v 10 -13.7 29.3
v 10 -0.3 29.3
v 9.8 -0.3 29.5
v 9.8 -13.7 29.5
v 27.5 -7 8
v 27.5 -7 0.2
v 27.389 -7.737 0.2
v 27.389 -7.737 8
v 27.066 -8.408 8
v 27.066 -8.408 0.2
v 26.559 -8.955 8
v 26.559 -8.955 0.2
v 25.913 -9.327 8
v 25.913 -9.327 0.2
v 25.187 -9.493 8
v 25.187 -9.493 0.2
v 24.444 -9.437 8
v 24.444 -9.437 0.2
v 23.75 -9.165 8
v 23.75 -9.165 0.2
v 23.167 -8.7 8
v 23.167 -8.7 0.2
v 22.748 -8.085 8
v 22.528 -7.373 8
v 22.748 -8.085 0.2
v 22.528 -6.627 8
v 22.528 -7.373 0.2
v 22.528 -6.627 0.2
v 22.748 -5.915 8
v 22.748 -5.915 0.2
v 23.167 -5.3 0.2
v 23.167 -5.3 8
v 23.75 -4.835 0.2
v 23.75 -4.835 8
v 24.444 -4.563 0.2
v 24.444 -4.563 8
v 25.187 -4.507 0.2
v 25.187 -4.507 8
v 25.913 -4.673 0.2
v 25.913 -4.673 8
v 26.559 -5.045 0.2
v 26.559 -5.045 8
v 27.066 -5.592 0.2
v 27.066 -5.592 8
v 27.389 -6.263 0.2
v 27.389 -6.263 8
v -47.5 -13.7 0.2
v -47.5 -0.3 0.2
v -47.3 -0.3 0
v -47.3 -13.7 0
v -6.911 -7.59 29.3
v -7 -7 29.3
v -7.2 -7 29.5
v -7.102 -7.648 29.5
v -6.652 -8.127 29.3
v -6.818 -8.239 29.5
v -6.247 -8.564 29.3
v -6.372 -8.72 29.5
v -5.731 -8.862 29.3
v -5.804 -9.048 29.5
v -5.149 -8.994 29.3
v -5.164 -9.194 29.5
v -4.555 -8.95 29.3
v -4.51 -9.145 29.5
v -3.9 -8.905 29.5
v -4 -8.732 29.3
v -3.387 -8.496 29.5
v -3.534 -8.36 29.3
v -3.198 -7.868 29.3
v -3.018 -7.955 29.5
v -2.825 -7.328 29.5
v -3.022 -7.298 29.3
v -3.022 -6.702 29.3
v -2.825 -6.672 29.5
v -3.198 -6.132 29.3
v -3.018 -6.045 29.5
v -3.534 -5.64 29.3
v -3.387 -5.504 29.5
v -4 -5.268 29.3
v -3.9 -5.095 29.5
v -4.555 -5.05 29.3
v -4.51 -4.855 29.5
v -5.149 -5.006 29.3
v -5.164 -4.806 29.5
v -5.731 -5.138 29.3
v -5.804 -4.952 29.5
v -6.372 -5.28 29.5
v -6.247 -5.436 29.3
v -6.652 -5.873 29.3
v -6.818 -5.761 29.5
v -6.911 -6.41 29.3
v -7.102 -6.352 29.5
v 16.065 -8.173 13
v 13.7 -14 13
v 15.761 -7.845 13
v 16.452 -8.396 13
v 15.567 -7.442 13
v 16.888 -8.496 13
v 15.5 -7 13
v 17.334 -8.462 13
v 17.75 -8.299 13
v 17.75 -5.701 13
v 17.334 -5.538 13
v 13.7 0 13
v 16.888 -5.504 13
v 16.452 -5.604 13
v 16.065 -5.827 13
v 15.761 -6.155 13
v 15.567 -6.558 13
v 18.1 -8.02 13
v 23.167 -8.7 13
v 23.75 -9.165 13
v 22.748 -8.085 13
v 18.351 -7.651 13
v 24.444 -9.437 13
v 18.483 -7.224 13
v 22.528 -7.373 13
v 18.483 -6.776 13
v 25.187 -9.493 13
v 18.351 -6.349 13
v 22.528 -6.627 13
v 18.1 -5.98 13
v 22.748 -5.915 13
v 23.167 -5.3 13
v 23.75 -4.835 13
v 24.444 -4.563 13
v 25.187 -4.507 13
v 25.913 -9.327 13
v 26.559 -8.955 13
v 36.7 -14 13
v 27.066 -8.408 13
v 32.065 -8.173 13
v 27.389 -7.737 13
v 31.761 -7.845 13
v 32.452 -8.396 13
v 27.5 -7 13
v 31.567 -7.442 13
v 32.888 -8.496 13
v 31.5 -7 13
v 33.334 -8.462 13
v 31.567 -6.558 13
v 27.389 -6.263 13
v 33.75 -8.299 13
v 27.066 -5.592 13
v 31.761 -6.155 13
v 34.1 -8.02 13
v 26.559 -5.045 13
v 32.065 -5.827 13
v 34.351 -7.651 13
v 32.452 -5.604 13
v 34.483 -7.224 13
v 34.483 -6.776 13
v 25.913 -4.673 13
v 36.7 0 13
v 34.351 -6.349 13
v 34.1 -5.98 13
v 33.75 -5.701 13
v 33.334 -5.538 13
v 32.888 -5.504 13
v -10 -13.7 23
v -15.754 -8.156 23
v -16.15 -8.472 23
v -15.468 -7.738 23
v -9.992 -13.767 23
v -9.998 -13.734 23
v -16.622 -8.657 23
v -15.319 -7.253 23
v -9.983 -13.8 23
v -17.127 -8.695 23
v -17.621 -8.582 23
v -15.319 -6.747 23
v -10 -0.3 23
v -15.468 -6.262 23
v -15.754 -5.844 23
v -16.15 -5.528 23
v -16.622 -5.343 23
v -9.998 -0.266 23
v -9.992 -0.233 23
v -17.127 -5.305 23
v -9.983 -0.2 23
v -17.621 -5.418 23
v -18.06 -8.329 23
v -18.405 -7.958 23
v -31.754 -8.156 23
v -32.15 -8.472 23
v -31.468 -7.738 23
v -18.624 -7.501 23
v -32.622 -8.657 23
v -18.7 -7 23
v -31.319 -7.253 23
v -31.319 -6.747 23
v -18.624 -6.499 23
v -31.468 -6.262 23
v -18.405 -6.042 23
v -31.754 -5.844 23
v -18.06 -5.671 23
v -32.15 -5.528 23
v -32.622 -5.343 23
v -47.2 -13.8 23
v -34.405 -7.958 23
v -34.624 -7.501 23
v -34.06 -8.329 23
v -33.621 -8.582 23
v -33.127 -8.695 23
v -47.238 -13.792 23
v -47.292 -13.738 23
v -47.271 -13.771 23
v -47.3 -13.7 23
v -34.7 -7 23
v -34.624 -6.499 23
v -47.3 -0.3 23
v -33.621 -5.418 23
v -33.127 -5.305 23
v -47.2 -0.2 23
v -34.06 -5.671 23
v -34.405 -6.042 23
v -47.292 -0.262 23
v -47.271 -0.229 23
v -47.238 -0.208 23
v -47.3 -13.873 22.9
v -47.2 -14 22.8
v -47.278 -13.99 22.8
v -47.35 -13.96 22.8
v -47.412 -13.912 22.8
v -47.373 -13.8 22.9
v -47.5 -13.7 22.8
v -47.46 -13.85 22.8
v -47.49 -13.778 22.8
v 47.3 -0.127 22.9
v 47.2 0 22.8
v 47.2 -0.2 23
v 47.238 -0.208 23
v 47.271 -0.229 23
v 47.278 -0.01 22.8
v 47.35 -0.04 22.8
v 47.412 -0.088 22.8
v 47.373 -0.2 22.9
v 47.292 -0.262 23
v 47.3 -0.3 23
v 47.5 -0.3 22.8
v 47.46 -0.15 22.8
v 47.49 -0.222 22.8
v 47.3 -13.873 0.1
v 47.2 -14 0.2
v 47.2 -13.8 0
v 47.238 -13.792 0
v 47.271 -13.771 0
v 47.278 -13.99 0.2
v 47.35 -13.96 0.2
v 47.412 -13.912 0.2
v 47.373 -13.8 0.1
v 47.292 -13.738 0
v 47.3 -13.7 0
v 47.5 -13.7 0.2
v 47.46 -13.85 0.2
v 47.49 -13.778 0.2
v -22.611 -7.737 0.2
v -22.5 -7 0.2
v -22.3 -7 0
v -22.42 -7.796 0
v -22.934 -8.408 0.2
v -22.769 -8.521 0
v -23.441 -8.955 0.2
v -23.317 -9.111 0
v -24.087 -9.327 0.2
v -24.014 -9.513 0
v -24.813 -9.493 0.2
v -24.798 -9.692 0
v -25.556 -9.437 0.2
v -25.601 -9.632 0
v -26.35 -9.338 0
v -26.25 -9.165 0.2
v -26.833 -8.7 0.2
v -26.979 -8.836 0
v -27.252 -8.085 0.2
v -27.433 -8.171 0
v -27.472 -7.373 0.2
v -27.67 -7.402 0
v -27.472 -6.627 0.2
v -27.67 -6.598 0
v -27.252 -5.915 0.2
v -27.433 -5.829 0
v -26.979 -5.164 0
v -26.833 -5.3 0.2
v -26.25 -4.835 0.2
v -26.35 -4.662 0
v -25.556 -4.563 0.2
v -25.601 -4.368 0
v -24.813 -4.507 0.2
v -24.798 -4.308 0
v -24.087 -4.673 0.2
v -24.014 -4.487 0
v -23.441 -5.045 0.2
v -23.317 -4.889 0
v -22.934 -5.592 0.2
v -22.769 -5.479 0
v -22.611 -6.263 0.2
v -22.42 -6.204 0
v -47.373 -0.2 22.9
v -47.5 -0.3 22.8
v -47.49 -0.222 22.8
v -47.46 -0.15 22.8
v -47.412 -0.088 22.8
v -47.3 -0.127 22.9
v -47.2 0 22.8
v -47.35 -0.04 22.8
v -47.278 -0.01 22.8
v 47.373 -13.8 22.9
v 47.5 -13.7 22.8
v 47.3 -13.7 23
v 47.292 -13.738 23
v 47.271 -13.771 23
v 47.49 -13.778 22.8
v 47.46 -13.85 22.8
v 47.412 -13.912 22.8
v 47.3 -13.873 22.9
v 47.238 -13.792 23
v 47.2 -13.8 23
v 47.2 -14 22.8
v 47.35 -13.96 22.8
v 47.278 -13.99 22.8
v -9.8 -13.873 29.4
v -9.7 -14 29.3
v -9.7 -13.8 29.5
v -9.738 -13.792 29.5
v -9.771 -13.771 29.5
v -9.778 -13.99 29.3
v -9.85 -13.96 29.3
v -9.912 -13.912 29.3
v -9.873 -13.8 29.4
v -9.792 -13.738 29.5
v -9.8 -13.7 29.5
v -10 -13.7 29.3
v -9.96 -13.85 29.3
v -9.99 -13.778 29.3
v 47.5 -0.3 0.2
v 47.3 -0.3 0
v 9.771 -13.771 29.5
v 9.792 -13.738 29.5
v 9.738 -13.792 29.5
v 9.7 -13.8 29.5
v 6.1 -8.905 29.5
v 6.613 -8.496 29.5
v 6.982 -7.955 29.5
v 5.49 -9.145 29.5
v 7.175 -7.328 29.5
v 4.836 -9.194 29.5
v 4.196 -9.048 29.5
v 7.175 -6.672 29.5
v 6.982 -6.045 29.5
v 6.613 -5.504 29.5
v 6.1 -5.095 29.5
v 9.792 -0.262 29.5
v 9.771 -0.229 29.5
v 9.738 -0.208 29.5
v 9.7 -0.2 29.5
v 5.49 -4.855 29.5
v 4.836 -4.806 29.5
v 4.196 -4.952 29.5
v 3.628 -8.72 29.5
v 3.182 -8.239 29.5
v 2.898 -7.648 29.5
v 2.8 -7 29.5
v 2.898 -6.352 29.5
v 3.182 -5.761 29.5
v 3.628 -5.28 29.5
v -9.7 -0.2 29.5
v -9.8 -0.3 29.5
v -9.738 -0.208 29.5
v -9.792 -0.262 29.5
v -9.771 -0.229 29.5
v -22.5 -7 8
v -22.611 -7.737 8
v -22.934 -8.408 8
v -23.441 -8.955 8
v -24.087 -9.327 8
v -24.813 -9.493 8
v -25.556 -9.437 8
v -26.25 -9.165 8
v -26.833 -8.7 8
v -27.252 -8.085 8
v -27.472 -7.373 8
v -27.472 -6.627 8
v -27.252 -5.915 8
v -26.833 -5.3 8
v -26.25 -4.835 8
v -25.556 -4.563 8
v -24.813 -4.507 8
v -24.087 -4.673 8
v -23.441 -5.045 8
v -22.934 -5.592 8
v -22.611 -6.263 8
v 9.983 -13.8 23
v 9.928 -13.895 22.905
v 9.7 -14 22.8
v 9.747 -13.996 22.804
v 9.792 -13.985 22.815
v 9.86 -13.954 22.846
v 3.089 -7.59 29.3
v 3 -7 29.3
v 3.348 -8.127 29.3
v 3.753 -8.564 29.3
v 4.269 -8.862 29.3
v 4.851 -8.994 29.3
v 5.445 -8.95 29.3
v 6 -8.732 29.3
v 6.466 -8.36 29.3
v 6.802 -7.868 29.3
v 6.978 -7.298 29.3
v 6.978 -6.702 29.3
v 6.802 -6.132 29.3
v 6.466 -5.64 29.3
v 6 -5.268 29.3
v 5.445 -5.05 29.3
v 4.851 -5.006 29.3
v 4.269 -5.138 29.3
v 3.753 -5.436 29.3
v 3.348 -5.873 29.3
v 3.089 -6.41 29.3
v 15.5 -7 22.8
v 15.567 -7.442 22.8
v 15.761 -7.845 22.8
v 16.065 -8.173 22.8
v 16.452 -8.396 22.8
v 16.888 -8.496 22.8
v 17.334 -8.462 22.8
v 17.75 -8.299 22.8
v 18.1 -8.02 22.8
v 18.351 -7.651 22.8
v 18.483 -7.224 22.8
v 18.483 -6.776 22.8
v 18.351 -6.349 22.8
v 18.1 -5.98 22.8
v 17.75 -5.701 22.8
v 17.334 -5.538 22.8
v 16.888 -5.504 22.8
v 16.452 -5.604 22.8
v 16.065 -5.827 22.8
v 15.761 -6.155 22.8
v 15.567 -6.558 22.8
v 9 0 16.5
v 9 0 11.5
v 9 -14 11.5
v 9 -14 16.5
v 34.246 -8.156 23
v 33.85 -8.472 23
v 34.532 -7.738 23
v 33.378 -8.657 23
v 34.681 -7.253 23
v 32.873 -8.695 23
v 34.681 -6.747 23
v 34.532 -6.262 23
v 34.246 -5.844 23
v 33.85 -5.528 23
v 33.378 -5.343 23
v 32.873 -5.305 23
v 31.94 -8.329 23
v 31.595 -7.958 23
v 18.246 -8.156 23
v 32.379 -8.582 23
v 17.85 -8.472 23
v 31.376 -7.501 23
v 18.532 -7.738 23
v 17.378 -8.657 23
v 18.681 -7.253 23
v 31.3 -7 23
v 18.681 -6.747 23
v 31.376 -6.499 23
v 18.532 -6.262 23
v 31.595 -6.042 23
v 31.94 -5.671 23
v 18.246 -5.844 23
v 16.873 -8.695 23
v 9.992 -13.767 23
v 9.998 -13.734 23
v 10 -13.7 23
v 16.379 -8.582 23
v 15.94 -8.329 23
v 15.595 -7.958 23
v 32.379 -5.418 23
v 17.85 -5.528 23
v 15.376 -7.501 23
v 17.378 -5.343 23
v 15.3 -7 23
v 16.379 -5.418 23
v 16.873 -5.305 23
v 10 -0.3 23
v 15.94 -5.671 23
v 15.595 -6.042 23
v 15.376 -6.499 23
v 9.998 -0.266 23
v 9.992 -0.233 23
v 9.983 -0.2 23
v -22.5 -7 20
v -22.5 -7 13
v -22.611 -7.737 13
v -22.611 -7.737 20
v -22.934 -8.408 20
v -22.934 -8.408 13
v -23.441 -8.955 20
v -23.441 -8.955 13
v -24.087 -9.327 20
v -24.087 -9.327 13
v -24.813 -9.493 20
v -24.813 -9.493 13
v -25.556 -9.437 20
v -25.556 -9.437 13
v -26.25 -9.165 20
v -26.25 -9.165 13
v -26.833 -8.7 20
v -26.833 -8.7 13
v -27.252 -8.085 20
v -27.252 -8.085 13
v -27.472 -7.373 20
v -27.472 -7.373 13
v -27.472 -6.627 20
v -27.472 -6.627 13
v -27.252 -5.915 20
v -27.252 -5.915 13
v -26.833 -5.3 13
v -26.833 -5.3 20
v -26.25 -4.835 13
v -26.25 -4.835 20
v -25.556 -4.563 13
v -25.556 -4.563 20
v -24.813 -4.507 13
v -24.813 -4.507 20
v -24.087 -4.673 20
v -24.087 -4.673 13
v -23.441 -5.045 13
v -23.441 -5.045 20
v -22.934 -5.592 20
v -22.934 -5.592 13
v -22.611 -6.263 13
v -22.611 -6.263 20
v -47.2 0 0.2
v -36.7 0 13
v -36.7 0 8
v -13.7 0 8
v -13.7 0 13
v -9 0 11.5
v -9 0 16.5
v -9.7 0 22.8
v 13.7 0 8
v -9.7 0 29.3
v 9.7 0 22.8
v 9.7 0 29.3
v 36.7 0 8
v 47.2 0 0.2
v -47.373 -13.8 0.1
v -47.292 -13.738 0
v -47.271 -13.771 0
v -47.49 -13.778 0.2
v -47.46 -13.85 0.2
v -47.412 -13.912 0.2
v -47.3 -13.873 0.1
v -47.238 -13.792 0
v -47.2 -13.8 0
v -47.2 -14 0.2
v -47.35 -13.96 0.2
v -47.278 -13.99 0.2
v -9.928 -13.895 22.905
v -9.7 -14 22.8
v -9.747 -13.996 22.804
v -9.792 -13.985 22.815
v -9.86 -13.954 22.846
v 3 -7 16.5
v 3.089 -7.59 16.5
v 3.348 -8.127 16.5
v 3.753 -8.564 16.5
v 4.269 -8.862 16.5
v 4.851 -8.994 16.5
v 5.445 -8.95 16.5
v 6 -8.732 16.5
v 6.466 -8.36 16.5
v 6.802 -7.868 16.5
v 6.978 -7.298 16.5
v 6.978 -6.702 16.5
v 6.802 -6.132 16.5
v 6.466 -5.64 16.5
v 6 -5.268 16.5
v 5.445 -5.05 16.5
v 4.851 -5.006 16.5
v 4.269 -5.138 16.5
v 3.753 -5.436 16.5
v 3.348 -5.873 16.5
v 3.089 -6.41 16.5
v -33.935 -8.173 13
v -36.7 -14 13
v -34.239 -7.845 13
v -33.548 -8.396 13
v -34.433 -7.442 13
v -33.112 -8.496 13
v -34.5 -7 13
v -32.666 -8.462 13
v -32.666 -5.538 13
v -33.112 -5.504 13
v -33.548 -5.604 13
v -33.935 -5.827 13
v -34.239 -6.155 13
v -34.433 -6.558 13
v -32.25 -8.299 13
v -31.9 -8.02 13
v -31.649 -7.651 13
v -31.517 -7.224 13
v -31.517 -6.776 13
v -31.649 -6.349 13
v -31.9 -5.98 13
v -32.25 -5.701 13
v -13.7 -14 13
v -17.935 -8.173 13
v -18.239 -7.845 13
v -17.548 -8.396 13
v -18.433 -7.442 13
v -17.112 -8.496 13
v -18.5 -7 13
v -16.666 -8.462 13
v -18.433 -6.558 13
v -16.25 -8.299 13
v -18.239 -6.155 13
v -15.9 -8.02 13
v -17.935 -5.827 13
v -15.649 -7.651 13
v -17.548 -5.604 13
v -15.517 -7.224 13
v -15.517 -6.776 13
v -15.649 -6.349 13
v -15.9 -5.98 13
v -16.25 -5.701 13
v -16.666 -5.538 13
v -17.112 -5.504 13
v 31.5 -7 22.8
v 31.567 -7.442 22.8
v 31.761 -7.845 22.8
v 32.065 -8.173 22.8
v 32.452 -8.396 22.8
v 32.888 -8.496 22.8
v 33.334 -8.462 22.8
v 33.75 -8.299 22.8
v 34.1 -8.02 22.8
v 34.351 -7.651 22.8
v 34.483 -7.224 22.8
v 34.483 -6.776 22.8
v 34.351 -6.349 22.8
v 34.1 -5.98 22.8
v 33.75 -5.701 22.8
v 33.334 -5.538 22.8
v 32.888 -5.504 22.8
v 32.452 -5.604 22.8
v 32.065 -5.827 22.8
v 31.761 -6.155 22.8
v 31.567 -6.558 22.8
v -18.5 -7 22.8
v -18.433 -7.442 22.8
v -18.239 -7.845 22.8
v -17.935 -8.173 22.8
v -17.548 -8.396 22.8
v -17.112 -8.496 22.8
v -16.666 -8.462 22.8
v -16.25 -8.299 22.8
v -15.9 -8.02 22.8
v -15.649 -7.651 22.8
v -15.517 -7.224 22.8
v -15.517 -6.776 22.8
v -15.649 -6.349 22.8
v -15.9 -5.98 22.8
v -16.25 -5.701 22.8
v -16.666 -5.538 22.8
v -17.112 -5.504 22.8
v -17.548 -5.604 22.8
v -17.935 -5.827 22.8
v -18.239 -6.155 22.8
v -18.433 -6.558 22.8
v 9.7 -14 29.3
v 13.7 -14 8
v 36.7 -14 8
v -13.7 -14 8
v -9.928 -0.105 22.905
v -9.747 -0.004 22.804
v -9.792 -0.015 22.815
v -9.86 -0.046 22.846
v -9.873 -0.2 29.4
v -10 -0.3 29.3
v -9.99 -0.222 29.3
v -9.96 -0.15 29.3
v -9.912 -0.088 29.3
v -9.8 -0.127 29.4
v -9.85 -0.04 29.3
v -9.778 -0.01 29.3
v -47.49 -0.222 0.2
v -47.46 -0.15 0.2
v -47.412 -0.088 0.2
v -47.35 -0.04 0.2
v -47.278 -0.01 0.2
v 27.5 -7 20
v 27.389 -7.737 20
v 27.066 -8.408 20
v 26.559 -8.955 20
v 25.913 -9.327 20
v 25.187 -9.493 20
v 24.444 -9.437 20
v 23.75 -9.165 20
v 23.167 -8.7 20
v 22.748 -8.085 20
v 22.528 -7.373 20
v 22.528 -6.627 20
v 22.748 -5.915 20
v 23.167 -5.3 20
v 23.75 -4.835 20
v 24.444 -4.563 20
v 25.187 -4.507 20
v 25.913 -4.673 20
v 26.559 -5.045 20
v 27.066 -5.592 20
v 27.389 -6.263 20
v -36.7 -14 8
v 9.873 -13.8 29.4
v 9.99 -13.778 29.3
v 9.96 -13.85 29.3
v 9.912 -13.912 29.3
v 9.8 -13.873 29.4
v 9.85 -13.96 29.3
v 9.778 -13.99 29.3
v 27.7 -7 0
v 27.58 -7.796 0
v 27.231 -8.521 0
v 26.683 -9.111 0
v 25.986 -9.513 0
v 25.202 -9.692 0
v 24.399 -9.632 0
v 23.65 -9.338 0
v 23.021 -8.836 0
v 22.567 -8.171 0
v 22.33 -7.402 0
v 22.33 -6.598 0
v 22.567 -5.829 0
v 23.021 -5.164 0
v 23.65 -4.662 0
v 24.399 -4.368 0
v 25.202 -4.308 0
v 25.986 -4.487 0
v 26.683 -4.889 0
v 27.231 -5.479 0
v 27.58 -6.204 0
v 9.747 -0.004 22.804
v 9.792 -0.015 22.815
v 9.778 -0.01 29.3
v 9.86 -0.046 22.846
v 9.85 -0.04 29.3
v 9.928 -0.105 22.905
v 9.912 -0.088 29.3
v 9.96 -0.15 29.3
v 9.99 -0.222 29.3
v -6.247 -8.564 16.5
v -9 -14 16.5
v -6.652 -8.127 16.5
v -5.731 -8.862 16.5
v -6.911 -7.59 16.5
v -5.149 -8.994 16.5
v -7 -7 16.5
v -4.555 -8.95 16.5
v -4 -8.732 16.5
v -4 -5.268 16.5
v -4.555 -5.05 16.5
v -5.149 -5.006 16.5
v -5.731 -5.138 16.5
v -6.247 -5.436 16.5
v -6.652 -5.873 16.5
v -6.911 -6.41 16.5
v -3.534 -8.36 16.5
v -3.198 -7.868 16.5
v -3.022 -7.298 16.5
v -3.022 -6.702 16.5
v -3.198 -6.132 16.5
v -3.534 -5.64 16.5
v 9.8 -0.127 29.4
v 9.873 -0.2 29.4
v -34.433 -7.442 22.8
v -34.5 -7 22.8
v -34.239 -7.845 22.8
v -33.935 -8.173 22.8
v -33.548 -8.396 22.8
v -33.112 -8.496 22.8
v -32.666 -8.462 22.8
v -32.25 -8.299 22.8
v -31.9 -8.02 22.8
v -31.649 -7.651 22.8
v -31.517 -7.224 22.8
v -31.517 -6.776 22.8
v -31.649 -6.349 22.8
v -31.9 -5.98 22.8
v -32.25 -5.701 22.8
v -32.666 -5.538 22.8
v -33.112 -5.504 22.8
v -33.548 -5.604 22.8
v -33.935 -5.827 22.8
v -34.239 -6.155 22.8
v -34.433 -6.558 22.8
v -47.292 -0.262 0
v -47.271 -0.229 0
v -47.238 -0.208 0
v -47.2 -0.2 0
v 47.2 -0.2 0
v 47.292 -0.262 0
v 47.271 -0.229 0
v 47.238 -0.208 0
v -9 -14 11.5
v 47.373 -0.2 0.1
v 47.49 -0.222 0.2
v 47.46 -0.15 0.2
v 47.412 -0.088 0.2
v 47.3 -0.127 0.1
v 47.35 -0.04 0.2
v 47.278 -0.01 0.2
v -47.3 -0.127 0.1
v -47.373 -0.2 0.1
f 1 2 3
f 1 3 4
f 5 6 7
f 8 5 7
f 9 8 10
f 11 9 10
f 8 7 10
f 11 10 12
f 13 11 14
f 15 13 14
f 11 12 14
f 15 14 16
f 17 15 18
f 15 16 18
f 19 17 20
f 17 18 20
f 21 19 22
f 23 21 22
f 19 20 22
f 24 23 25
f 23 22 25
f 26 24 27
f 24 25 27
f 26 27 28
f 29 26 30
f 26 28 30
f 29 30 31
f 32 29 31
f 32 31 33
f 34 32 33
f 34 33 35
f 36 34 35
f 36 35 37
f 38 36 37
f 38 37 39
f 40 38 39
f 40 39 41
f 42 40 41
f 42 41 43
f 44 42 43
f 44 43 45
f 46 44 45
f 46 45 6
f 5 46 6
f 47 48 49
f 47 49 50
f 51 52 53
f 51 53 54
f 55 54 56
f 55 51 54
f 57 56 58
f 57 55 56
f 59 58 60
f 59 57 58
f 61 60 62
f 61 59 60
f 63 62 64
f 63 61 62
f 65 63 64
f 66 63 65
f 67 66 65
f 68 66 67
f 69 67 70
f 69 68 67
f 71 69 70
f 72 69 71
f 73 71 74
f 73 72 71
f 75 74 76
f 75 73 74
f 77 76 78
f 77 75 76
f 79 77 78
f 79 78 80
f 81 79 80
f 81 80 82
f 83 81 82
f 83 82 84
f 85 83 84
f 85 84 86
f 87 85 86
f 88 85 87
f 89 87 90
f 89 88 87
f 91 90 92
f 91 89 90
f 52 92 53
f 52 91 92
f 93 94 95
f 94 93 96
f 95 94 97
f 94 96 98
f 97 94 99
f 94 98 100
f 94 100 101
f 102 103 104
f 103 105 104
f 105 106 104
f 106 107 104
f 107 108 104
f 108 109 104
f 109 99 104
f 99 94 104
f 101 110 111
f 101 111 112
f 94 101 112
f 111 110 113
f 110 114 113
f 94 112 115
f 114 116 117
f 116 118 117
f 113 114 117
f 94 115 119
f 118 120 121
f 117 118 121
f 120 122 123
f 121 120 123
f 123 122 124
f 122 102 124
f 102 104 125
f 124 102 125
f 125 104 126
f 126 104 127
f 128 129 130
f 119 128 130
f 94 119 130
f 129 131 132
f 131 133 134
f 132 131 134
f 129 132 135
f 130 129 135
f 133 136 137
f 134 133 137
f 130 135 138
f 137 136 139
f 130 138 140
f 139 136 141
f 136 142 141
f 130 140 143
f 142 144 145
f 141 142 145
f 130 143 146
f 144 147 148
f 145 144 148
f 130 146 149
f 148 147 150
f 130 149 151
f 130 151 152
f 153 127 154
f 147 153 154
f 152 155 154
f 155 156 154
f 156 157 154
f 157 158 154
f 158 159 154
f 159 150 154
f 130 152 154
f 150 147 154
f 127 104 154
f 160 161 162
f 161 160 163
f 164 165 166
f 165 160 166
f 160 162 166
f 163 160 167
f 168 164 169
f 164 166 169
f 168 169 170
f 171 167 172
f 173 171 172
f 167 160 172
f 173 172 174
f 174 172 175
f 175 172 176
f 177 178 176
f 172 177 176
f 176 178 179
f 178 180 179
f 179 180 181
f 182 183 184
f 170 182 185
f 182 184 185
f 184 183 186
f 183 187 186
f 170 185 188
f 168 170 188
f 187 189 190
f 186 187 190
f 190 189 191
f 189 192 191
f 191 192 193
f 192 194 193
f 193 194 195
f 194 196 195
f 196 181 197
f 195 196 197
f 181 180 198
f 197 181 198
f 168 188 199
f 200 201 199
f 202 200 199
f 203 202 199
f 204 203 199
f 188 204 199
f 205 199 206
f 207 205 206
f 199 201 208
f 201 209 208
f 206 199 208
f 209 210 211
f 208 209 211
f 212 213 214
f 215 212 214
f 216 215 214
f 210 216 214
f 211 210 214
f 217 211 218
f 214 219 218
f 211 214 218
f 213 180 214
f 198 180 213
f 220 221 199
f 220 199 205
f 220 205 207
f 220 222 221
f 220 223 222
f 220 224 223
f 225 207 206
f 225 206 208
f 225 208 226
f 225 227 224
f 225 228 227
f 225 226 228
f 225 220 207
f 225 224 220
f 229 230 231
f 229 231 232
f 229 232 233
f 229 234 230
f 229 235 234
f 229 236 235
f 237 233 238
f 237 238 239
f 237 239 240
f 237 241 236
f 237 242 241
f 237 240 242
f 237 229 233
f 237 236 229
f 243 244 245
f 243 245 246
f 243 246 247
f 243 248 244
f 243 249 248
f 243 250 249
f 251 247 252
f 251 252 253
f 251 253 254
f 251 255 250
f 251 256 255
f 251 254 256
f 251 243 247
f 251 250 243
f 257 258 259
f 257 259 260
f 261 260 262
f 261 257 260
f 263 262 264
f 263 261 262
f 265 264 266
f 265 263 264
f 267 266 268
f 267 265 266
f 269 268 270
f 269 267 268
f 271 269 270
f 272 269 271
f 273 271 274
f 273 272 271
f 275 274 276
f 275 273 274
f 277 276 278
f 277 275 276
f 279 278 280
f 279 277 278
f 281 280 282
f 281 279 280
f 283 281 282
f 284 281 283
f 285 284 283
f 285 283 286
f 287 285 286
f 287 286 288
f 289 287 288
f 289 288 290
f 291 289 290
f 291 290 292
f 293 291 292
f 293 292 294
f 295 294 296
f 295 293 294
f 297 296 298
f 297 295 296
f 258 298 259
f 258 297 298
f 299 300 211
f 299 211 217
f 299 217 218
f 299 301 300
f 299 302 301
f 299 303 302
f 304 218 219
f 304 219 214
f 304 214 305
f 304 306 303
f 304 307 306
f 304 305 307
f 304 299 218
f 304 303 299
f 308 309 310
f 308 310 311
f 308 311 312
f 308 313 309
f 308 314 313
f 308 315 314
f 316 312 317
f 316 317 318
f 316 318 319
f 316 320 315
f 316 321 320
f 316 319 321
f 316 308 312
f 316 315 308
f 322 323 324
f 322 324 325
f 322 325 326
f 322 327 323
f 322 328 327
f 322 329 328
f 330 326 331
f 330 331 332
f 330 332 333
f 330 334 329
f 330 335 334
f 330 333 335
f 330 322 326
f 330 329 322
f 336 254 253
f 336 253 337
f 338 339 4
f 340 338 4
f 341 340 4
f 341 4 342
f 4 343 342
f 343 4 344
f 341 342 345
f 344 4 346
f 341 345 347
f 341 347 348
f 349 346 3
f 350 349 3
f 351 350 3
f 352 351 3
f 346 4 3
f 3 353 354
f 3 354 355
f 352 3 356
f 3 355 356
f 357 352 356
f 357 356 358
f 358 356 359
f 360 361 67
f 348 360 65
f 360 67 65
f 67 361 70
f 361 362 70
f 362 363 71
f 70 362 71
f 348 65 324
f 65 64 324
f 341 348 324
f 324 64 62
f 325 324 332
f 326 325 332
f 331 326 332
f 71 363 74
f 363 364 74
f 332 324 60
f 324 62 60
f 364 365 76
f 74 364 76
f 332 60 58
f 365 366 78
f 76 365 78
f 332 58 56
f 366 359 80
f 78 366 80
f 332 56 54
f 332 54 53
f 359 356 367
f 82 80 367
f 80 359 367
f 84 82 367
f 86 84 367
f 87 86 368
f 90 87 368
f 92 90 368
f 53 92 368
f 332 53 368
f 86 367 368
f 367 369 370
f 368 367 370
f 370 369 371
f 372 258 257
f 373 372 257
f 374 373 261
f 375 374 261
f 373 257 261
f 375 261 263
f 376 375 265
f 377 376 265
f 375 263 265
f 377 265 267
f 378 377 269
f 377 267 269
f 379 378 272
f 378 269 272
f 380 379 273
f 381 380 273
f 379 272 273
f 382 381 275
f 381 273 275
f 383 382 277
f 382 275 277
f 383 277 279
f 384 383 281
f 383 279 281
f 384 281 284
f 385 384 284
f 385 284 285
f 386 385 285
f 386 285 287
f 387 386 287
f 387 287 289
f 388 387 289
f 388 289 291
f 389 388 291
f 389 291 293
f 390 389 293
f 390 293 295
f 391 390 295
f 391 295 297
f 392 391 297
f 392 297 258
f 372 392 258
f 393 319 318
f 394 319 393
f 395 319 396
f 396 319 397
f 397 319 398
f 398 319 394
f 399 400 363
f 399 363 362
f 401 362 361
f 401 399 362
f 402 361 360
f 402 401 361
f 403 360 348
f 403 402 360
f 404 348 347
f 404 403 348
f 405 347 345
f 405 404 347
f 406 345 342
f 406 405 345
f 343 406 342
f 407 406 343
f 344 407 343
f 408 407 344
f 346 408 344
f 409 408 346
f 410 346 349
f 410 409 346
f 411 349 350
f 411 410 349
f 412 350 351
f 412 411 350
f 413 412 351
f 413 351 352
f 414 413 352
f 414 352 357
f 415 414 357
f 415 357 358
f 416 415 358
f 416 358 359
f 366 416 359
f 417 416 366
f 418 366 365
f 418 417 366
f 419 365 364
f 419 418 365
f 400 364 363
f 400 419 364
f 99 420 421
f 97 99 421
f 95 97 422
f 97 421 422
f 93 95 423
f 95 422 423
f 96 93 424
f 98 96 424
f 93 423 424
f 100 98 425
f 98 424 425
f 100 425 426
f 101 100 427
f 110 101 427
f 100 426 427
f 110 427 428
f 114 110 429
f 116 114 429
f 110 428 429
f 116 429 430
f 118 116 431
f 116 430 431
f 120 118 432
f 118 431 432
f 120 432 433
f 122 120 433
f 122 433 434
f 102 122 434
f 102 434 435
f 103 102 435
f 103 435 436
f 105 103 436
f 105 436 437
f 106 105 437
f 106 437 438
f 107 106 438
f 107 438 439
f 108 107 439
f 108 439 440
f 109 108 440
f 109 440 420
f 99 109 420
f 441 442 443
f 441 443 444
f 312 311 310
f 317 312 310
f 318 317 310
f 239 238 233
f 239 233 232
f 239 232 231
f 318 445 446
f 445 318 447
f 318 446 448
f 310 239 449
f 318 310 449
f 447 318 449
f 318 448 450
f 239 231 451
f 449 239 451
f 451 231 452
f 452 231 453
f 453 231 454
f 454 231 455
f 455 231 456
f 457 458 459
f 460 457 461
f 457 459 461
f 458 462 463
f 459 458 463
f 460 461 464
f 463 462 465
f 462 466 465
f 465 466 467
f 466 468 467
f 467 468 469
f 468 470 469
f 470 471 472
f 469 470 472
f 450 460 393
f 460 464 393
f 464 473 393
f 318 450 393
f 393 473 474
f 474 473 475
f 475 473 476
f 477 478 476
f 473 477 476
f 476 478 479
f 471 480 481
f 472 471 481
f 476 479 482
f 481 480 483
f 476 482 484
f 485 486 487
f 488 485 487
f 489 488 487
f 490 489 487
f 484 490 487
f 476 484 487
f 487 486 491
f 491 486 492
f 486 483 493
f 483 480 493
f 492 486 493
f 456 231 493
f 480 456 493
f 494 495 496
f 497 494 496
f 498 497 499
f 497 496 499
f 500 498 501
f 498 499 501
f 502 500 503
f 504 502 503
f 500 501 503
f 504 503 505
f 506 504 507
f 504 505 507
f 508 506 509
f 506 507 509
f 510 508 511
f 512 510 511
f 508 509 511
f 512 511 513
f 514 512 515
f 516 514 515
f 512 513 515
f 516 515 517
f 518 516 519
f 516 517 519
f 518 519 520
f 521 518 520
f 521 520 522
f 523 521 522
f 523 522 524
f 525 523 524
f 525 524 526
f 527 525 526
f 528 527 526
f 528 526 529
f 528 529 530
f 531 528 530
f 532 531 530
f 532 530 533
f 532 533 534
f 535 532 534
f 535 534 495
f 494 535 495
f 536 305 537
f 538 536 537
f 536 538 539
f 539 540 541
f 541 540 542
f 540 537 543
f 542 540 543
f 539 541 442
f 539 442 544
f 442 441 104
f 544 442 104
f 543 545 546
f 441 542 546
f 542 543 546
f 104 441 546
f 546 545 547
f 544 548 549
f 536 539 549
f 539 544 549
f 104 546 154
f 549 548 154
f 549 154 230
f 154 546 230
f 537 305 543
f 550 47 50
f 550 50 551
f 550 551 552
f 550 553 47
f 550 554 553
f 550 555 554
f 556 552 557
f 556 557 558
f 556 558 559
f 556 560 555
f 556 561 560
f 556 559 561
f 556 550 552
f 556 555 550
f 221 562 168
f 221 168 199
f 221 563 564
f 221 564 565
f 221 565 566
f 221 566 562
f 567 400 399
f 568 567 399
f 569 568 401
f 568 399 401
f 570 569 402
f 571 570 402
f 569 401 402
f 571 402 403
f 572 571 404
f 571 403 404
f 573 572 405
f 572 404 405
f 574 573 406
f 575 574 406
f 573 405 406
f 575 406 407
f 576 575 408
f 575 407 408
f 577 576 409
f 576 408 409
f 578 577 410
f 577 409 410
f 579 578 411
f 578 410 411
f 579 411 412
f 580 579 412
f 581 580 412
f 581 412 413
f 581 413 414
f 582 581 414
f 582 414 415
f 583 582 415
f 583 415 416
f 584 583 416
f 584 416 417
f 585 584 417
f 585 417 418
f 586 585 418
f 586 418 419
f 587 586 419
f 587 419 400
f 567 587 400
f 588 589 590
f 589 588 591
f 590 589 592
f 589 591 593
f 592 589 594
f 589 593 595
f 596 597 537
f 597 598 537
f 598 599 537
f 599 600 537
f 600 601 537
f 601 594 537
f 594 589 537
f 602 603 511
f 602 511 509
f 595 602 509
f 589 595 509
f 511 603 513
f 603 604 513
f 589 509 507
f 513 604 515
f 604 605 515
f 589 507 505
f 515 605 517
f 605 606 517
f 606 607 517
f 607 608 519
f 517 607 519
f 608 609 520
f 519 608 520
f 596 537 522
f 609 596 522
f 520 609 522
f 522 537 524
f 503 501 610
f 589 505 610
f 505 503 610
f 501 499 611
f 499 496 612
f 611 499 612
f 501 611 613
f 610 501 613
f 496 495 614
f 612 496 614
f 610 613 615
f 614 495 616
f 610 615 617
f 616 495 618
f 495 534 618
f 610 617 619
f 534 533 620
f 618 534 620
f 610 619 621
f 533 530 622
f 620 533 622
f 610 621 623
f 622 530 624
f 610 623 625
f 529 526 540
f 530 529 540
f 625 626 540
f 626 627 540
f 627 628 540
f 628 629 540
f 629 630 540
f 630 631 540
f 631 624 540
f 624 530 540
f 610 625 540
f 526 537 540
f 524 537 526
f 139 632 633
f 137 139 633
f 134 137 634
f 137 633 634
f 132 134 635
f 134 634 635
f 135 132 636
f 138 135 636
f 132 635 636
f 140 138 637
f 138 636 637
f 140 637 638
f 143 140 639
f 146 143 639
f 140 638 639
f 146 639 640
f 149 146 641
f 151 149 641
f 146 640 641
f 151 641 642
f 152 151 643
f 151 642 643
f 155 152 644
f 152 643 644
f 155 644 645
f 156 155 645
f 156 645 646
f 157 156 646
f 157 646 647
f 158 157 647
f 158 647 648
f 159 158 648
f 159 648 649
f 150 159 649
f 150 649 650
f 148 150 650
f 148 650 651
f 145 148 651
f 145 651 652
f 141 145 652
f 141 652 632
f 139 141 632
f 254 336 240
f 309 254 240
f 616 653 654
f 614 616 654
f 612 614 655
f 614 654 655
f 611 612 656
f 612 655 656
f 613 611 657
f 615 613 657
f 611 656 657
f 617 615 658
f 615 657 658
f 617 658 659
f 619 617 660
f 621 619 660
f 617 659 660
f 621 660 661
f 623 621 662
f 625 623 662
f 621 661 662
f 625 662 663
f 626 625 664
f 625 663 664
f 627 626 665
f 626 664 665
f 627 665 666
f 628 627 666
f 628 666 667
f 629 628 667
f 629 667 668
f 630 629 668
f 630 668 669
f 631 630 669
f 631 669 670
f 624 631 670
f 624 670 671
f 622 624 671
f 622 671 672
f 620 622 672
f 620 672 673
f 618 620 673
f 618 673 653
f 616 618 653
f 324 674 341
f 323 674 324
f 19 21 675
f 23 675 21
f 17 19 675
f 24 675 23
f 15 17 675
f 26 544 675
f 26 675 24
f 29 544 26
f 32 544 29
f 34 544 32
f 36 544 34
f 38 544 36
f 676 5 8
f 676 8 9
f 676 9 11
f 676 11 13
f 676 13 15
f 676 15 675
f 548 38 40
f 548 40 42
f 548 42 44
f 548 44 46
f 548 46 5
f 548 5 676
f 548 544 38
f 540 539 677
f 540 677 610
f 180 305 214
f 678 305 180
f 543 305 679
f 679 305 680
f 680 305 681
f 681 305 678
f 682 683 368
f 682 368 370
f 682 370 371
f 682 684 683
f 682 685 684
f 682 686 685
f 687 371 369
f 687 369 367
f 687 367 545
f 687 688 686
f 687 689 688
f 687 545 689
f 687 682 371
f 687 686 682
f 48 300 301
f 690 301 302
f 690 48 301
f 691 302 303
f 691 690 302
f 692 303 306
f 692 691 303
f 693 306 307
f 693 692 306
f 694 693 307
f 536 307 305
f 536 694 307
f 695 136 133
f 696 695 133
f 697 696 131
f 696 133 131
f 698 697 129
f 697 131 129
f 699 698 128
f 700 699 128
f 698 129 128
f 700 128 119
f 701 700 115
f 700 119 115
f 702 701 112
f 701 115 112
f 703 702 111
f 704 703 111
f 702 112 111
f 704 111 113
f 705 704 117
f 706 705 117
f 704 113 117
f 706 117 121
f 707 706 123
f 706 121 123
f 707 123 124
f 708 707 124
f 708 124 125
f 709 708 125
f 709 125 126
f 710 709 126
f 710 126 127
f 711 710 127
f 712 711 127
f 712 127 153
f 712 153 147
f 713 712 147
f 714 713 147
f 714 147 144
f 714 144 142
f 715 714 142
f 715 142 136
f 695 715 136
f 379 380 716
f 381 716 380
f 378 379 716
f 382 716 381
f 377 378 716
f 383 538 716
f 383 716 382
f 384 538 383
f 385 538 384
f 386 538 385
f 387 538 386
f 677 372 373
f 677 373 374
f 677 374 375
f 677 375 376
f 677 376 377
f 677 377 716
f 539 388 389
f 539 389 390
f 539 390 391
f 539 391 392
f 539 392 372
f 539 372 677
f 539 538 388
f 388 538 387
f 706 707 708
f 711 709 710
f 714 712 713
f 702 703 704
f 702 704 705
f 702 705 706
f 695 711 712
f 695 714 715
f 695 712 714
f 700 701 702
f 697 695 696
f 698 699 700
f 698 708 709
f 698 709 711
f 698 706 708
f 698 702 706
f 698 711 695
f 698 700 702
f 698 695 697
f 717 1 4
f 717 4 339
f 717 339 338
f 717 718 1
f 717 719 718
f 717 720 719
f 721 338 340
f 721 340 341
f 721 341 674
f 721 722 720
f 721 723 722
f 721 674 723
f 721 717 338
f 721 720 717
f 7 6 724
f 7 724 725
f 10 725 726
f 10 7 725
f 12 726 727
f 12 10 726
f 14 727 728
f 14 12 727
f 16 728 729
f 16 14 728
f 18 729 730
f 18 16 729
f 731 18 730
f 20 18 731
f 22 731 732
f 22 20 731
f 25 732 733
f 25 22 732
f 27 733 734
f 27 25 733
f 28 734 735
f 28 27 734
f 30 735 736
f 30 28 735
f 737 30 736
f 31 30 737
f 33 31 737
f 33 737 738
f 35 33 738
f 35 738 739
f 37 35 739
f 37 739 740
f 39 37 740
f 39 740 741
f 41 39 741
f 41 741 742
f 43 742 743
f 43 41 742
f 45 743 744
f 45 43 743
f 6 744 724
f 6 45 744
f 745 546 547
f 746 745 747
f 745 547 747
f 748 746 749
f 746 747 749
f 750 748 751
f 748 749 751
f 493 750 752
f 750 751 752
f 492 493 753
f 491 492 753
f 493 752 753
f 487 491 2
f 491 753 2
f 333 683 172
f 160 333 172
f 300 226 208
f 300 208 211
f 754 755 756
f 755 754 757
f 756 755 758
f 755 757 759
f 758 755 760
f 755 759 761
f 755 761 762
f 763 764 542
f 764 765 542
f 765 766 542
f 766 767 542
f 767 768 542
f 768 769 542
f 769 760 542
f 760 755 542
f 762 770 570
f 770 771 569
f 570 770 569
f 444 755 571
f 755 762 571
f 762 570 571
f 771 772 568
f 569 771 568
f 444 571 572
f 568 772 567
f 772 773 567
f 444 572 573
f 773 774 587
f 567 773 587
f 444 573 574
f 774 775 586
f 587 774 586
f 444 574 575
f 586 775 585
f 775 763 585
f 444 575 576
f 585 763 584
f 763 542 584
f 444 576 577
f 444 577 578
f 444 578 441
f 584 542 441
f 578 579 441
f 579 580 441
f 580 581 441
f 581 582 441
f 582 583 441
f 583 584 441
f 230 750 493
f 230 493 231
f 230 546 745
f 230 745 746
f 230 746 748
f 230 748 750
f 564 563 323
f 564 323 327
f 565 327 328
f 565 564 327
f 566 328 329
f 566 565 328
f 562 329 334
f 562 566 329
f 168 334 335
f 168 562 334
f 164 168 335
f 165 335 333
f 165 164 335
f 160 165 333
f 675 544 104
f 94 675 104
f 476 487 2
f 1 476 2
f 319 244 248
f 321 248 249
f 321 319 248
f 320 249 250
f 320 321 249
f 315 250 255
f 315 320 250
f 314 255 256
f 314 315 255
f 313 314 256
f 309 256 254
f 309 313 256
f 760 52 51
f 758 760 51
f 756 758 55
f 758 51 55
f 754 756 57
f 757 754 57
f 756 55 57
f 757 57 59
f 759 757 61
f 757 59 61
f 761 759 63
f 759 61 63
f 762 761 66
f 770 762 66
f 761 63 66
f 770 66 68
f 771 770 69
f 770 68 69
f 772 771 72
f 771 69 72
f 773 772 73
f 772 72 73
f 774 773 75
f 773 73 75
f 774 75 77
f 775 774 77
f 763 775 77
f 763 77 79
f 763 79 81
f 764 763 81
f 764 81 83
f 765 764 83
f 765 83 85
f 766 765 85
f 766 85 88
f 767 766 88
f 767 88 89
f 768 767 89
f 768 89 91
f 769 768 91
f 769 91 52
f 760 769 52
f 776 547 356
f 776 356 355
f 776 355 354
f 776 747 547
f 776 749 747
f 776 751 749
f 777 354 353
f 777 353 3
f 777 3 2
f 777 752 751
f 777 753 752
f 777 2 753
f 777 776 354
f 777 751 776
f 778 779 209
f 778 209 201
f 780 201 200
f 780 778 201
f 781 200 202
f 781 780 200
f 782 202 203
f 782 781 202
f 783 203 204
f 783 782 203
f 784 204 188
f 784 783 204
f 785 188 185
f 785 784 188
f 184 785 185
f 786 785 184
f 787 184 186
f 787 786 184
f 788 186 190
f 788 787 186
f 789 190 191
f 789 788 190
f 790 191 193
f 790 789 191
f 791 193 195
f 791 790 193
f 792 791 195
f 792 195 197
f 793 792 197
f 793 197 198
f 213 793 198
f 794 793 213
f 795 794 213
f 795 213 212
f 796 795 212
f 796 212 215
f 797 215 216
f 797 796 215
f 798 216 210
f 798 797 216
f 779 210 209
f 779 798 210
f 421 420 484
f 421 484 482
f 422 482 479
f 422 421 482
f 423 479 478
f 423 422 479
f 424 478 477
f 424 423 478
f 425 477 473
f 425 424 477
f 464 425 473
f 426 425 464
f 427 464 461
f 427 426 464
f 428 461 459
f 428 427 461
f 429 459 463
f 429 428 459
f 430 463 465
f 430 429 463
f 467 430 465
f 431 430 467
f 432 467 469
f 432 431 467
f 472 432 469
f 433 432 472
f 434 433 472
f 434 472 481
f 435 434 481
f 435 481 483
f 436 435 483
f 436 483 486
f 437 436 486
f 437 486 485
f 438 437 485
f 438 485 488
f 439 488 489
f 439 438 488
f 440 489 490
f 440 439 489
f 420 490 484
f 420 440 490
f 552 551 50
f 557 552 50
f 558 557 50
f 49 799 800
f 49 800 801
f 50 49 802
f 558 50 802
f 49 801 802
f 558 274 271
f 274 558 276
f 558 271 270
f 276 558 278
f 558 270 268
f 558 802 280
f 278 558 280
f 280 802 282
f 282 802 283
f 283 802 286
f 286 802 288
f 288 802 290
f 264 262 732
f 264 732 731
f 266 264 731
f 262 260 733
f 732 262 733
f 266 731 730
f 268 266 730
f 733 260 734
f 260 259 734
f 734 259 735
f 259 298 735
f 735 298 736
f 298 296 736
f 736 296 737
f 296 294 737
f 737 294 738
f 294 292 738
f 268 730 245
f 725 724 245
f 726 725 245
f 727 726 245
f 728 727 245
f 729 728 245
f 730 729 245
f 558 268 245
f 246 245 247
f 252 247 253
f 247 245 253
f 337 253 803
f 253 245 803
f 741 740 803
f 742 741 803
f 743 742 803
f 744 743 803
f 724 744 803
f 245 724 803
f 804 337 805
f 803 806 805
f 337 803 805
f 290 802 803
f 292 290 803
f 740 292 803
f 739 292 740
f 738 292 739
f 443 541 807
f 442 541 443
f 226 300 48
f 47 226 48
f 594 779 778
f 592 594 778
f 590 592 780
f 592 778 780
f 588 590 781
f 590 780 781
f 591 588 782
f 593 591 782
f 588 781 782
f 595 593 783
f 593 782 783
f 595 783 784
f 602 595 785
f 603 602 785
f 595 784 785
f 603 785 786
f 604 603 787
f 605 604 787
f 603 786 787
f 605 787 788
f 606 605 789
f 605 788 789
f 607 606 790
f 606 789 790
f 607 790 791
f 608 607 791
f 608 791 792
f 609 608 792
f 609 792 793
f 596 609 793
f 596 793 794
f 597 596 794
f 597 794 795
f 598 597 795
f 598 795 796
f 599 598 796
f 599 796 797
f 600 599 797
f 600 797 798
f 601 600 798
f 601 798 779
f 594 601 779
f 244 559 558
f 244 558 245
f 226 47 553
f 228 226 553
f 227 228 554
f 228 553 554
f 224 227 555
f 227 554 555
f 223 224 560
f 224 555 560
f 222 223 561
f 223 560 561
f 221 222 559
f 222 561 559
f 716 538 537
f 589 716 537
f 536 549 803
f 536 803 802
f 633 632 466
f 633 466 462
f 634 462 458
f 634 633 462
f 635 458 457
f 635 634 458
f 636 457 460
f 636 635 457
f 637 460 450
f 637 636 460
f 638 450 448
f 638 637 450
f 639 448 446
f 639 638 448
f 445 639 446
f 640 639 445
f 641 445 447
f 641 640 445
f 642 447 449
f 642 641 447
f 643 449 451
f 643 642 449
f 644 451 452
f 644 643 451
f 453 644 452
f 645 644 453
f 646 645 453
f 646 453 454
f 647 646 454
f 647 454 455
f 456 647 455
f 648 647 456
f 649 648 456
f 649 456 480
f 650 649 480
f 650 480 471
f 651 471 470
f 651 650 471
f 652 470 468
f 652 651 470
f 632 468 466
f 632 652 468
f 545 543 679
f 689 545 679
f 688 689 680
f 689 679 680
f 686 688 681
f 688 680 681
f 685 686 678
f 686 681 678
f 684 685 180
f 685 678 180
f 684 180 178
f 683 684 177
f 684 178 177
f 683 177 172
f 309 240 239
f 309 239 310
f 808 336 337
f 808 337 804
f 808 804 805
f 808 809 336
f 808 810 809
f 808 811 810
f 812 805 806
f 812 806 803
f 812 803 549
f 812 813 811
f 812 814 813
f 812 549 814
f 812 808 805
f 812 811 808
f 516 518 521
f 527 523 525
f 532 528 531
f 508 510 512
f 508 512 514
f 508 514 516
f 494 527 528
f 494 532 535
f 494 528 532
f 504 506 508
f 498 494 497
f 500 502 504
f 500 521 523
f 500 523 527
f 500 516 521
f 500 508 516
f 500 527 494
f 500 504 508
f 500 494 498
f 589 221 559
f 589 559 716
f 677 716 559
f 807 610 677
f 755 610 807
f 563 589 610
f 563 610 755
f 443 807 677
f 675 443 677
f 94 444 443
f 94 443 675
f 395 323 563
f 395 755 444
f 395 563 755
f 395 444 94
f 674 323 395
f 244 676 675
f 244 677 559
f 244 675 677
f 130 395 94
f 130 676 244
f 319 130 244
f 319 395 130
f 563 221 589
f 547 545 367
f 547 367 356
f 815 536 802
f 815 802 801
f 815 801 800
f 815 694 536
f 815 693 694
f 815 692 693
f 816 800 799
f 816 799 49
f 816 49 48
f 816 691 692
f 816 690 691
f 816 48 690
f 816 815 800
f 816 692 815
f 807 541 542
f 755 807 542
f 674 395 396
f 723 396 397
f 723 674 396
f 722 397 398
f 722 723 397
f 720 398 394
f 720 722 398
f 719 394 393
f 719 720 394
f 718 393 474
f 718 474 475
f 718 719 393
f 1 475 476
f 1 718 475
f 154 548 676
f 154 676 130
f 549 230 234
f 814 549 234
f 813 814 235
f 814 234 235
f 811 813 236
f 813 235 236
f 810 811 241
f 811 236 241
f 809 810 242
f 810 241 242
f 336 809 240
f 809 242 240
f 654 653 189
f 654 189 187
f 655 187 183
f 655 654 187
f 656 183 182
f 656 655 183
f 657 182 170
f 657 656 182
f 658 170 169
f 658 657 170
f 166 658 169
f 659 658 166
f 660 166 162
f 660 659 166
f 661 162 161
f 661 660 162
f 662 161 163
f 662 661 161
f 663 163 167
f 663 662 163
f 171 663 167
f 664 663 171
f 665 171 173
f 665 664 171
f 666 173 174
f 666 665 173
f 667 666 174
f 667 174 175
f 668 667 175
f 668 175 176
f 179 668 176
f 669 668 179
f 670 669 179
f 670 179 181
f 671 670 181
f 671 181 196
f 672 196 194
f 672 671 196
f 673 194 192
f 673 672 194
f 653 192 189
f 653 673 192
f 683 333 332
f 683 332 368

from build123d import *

# Parameters (mm, degrees)
SKETCH_W        = 18
SKETCH_H        = 5
SKETCH_W_2      = 23
PAD_DEPTH       = 14
SKETCH001_R     = 2
POCKET_DEPTH    = 17.5
SKETCH002_R     = 1.5
POCKET001_DEPTH = 14
SKETCH005_R     = 1.5
POCKET002_DEPTH = 14
SKETCH006_R     = 2.5
POCKET003_DEPTH = 20
FILLET_R        = 0.3
CHAMFER_SIZE    = 0.2
CHAMFER001_SIZE = 0.2
CHAMFER002_SIZE = 0.2
CHAMFER003_SIZE = 0.2
CHAMFER004_SIZE = 0.2


with BuildPart() as part:
    # Sketch → Pad (new body)
    with BuildSketch(Plane.XZ):
        Polygon((-47.5, 0), (47.5, 0), (47.5, 23), (10, 23), (10, 29.5), (-10, 29.5), (-10, 23), (-47.5, 23), align=None)
        with Locations((0, 14)):
            Rectangle(SKETCH_W, SKETCH_H, mode=Mode.SUBTRACT)
        with Locations((-25.2, 10.5)):
            Rectangle(SKETCH_W_2, SKETCH_H, mode=Mode.SUBTRACT)
        with Locations((25.2, 10.5)):
            Rectangle(SKETCH_W_2, SKETCH_H, mode=Mode.SUBTRACT)
    extrude(amount=PAD_DEPTH)

    # Sketch001 → Pocket (cut)
    with BuildSketch(Plane(origin=(0, 0, 29.5), x_dir=(-1, 0, 0), z_dir=(0, 0, 1))):
        with Locations((-5, 7)):
            Circle(SKETCH001_R)
        with Locations((5, 7)):
            Circle(SKETCH001_R)
    extrude(amount=-POCKET_DEPTH, mode=Mode.SUBTRACT)

    # Sketch002 → Pocket001 (cut)
    with BuildSketch(Plane(origin=(0, 0, 23), x_dir=(-1, 0, 0), z_dir=(0, 0, 1))):
        with Locations((-17, 7)):
            Circle(SKETCH002_R)
        with Locations((-33, 7)):
            Circle(SKETCH002_R)
    extrude(amount=-POCKET001_DEPTH, mode=Mode.SUBTRACT)

    # Sketch005 → Pocket002 (cut)
    with BuildSketch(Plane(origin=(0, 0, 23), x_dir=(-1, 0, 0), z_dir=(0, 0, 1))):
        with Locations((33, 7)):
            Circle(SKETCH005_R)
        with Locations((17, 7)):
            Circle(SKETCH005_R)
    extrude(amount=-POCKET002_DEPTH, mode=Mode.SUBTRACT)

    # Sketch006 → Pocket003 (cut)
    with BuildSketch(Plane(origin=(0, 0, 0), x_dir=(1, 0, 0), z_dir=(0, 0, -1))):
        with Locations((-25, 7)):
            Circle(SKETCH006_R)
        with Locations((25, 7)):
            Circle(SKETCH006_R)
    extrude(amount=-POCKET003_DEPTH, mode=Mode.SUBTRACT)

    # Fillet
    fillet_edges = [part.edges().sort_by_distance(p)[0] for p in [
        (-47.5, -14, 11.5),
        (-47.5, 0, 11.5),
        (47.5, 0, 11.5),
        (47.5, -14, 11.5),
        (10, -14, 26.25),
        (10, 0, 26.25),
        (-10, 0, 26.25),
        (-10, -14, 26.25),
    ]]
    fillet(fillet_edges, radius=FILLET_R)

    # Chamfer
    chamfer_edges = [part.edges().sort_by_distance(p)[0] for p in [
        (-9.912132, -13.912132, 29.5),
        (-10, -7, 29.5),
        (-9.912132, -0.087868, 29.5),
        (0, 0, 29.5),
        (9.912132, -0.087868, 29.5),
        (10, -7, 29.5),
        (9.912132, -13.912132, 29.5),
        (0, -14, 29.5),
    ]]
    chamfer(chamfer_edges, length=CHAMFER_SIZE)

    # Chamfer001
    chamfer001_edges = [part.edges().sort_by_distance(p)[0] for p in [
        (28.6, -14, 23),
        (47.5, -7, 23),
        (47.412132, -13.912132, 23),
        (47.412132, -0.087868, 23),
        (28.6, 0, 23),
        (9.85, -14, 23),
        (9.85, 0, 23),
    ]]
    chamfer(chamfer001_edges, length=CHAMFER001_SIZE)

    # Chamfer002
    chamfer002_edges = [part.edges().sort_by_distance(p)[0] for p in [
        (-9.85, -14, 23),
        (-28.6, -14, 23),
        (-47.412132, -13.912132, 23),
        (-47.5, -7, 23),
        (-9.85, 0, 23),
        (-28.6, 0, 23),
        (-47.412132, -0.087868, 23),
    ]]
    chamfer(chamfer002_edges, length=CHAMFER002_SIZE)

    # Chamfer003
    chamfer003_edges = [part.edges().sort_by_distance(p)[0] for p in [
        (-47.412132, -13.912132, 0),
        (0, -14, 0),
        (-47.5, -7, 0),
        (-47.412132, -0.087868, 0),
        (0, 0, 0),
        (47.412132, -0.087868, 0),
        (47.5, -7, 0),
        (47.412132, -13.912132, 0),
        (22.5, -7, 0),
        (-27.5, -7, 0),
    ]]
    chamfer(chamfer003_edges, length=CHAMFER003_SIZE)

    # Chamfer004
    chamfer004_edges = [part.edges().sort_by_distance(p)[0] for p in [
        (34.5, -7, 23),
        (18.5, -7, 23),
        (7, -7, 29.5),
        (-3, -7, 29.5),
        (-15.5, -7, 23),
        (-31.5, -7, 23),
    ]]
    chamfer(chamfer004_edges, length=CHAMFER004_SIZE)


solid = part.part
